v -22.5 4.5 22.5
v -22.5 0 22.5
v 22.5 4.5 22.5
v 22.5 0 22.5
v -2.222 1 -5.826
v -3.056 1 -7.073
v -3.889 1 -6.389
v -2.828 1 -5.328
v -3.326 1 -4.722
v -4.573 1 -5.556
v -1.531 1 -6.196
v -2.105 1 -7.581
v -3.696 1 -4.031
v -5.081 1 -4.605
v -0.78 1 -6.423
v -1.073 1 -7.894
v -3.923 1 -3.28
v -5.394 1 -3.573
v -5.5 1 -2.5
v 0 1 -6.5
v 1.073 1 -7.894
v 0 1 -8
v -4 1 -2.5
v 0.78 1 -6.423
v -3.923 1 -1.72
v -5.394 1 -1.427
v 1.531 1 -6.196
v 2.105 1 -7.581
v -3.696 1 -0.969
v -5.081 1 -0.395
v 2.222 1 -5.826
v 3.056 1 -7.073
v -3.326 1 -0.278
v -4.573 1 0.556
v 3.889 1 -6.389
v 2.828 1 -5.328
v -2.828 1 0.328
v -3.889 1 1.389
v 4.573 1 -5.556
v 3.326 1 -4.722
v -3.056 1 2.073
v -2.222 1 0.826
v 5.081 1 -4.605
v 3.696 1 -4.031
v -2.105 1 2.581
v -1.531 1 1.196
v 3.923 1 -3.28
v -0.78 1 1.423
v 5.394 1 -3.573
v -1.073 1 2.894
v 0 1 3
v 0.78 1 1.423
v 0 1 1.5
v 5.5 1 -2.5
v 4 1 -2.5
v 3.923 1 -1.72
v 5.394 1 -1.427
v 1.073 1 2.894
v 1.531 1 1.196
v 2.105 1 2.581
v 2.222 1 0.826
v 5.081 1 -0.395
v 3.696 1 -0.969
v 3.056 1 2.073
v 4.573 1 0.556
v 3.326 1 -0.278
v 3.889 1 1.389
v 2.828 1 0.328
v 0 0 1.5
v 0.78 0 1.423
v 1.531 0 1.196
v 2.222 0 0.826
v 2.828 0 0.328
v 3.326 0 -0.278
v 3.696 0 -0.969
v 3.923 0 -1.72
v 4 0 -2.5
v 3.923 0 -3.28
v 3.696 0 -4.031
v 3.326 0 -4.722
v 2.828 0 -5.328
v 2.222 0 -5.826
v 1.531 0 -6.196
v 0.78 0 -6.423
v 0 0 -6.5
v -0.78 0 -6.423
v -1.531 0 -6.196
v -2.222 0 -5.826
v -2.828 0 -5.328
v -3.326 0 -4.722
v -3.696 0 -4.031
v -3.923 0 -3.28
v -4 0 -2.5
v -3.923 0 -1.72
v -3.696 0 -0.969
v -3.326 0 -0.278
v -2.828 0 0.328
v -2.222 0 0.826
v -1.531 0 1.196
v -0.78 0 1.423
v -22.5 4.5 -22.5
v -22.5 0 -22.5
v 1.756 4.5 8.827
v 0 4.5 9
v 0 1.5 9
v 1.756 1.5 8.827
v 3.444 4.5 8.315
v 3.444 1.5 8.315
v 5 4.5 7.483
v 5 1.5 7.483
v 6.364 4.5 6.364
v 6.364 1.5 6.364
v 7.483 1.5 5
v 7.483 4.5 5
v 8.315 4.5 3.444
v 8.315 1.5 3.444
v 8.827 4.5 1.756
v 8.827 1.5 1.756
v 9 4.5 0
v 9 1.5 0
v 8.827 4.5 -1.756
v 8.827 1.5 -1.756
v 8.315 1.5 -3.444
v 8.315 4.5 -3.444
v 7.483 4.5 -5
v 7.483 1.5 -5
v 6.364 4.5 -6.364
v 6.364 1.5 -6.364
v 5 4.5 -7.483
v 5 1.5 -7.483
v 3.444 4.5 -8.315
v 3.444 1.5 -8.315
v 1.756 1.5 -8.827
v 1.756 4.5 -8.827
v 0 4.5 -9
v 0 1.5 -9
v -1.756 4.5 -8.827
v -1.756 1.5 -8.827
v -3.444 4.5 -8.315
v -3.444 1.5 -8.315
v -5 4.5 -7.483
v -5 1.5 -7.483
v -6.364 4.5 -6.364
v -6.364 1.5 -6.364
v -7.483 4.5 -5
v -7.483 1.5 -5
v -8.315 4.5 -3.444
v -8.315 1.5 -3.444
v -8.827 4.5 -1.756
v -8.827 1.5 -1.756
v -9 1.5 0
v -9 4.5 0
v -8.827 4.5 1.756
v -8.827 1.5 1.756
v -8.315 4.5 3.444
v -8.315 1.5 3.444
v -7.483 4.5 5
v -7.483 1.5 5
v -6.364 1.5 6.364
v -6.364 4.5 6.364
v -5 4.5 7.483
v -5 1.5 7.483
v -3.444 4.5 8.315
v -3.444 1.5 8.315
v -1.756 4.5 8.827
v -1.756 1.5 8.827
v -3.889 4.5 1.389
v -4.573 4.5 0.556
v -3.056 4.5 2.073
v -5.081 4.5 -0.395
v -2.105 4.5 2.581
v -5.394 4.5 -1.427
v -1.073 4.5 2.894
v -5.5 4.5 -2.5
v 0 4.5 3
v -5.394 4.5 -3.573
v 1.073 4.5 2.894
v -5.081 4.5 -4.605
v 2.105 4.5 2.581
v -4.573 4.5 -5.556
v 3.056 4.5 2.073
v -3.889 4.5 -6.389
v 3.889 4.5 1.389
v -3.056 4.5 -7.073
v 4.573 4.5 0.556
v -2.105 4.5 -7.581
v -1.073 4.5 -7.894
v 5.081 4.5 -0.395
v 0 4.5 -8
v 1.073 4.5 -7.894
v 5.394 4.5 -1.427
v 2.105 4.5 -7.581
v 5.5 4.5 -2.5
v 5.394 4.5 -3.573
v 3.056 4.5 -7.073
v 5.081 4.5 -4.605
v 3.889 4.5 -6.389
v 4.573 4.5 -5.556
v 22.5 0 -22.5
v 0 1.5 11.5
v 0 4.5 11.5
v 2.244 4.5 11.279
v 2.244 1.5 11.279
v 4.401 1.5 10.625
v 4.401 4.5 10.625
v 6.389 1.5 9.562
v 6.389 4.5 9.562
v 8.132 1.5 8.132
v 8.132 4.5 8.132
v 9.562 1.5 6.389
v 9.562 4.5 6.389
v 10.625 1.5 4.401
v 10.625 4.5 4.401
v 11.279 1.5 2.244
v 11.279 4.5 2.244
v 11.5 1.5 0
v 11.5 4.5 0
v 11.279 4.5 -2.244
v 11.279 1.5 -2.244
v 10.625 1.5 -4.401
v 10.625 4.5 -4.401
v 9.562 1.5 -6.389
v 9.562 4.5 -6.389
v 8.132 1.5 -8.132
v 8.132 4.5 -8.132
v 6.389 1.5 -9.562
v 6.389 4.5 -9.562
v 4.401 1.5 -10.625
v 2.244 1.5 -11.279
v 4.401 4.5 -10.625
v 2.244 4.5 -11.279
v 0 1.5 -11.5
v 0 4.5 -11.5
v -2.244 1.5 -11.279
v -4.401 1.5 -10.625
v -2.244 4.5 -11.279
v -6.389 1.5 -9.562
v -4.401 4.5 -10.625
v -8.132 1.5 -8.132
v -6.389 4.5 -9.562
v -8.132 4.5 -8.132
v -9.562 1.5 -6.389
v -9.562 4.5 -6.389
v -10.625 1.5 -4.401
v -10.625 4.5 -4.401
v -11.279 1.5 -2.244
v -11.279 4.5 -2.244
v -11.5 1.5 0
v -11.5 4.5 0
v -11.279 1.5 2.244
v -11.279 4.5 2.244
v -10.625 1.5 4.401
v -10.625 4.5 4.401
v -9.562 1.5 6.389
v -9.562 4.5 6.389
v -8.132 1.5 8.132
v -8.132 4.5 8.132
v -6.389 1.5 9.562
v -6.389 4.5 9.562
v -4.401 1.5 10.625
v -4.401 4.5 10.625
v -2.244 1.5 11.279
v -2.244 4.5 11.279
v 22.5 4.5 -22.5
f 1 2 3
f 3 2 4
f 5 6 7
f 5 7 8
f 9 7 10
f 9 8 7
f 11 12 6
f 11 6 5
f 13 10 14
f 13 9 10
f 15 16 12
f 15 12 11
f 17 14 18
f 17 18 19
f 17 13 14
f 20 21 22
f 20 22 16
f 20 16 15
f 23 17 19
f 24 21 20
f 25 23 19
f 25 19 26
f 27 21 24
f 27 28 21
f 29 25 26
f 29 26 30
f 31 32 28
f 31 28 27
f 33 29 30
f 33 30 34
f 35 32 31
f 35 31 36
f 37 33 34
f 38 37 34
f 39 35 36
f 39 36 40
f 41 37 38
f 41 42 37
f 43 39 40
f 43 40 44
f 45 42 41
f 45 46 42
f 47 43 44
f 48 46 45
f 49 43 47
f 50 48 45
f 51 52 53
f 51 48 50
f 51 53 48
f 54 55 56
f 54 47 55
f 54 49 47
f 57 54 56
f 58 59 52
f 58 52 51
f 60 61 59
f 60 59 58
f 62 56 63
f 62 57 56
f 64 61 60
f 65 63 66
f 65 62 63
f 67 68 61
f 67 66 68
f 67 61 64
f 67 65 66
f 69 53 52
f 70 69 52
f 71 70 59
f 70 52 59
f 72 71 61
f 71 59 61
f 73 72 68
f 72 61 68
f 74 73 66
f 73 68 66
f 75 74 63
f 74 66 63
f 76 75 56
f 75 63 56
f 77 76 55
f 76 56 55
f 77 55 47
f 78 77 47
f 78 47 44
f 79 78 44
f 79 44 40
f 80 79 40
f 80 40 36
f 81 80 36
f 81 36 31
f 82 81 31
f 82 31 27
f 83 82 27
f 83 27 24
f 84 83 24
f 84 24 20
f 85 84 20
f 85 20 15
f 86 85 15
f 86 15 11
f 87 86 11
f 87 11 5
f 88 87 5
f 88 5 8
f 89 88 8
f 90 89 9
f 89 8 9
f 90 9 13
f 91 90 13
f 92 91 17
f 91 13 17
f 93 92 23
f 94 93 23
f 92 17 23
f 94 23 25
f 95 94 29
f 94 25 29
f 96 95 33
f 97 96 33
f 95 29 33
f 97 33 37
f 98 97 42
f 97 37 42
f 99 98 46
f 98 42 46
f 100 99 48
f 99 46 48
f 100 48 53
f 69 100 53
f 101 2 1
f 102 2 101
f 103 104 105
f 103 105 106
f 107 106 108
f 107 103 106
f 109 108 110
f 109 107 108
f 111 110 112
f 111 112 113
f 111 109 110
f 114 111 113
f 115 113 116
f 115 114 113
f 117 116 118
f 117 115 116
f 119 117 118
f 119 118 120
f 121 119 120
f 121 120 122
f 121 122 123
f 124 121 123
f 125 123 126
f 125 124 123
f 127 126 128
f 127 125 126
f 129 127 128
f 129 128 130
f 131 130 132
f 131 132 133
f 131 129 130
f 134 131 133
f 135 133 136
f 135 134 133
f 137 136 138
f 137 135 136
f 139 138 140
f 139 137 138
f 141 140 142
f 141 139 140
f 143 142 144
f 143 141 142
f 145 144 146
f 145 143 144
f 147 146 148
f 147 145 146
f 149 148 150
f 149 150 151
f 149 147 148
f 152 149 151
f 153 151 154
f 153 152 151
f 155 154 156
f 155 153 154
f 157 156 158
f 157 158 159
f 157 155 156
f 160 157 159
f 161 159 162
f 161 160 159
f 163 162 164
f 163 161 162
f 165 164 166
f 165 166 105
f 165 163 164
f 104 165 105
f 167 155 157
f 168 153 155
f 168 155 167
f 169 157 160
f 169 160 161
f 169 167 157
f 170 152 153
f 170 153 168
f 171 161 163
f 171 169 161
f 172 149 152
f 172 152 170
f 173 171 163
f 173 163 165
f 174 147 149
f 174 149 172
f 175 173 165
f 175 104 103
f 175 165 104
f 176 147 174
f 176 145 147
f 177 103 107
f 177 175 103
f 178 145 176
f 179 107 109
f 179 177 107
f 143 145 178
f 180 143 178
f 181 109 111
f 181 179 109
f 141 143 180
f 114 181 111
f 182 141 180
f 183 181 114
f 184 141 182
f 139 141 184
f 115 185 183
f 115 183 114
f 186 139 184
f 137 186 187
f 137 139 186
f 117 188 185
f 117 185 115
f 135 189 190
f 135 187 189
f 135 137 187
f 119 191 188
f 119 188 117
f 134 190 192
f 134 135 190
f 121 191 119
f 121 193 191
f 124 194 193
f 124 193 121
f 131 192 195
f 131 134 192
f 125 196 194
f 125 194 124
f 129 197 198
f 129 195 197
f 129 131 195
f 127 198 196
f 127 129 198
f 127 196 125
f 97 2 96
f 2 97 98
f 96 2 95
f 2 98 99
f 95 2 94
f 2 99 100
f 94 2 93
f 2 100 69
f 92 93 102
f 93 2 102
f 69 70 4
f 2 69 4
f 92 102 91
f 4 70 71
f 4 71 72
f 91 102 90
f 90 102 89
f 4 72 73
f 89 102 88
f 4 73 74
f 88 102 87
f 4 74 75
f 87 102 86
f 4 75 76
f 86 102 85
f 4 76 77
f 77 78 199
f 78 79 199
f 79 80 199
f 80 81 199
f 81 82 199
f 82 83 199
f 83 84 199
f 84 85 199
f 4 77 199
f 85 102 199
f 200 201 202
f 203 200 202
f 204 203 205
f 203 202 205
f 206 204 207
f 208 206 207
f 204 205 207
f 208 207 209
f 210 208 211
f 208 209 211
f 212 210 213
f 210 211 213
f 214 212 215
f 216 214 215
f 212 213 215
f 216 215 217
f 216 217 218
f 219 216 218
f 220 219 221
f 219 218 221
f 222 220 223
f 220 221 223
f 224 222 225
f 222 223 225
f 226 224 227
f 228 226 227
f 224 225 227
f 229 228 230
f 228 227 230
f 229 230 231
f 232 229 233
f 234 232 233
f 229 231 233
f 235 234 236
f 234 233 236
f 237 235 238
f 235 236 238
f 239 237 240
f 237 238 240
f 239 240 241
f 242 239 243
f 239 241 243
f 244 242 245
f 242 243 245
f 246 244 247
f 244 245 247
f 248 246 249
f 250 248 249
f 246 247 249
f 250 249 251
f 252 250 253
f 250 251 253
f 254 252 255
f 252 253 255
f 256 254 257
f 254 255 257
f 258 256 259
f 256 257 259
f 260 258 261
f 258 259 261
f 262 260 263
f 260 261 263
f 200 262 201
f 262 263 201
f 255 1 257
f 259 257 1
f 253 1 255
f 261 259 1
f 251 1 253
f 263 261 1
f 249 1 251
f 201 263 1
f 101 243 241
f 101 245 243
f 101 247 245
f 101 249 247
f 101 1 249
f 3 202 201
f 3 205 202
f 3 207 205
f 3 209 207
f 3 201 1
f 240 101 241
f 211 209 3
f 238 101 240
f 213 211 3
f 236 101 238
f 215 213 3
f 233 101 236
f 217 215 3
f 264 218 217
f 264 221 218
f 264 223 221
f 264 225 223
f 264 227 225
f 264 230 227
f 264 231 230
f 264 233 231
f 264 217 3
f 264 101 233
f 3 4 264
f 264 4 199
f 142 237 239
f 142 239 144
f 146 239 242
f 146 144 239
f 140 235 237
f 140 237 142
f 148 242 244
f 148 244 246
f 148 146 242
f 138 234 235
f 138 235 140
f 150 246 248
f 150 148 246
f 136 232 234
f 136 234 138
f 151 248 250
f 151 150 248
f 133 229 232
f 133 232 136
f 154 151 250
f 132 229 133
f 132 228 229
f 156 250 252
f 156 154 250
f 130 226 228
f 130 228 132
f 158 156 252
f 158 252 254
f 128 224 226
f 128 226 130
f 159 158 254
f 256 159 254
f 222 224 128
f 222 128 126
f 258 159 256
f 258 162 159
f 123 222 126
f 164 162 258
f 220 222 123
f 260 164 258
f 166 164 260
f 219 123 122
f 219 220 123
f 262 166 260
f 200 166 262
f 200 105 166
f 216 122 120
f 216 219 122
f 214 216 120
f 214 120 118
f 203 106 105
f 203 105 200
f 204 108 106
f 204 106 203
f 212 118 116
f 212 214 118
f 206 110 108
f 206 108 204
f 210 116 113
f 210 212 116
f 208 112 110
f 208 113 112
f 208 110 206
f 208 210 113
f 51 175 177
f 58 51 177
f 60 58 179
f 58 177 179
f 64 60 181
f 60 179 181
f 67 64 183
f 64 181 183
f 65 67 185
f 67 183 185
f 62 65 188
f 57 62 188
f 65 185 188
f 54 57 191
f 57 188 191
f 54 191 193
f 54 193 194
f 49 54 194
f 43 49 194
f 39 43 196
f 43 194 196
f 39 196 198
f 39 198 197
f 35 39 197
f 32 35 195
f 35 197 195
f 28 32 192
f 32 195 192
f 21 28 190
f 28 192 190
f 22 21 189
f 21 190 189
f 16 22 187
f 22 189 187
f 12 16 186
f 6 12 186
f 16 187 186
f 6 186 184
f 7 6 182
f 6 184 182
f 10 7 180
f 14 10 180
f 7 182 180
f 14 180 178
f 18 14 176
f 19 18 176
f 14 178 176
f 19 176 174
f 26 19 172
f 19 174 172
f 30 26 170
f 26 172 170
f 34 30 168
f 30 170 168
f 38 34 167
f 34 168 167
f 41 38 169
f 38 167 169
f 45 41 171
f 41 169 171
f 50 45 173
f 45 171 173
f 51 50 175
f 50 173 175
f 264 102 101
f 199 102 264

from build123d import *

# Parameters (mm, degrees)
SKETCH_1_W          = 45
SKETCH_1_H          = 45
EXTRUDE_1_DEPTH     = 4.5
SKETCH_2_R          = 5.5
CUT_EXTRUDE_1_DEPTH = 3.5
SKETCH_3_R          = 4
CUT_EXTRUDE_2_DEPTH = 33.011716605
SKETCH_4_R          = 11.5
SKETCH_4_R_2        = 9
CUT_EXTRUDE_3_DEPTH = 3


with BuildPart() as part:
    # 草图1 → 凸台-拉伸1 (new body)
    with BuildSketch(Plane(origin=(0, 0, 0), x_dir=(1, 0, 0), z_dir=(0, 1, 0))):
        Rectangle(SKETCH_1_W, SKETCH_1_H)
    extrude(amount=EXTRUDE_1_DEPTH)

    # 草图2 → 切除-拉伸1 (cut)
    with BuildSketch(Plane(origin=(0, 4.5, 0), x_dir=(1, 0, 0), z_dir=(0, 1, 0))):
        with Locations(Location((0, 2.5, 0), (0, 0, 270))):
            Circle(SKETCH_2_R)
    extrude(amount=-CUT_EXTRUDE_1_DEPTH, mode=Mode.SUBTRACT)

    # 草图3 → 切除-拉伸2 (cut, through all)
    with BuildSketch(Plane(origin=(0, 1, 0), x_dir=(1, 0, 0), z_dir=(0, 1, 0))):
        with Locations(Location((0, 2.5, 0), (0, 0, 270))):
            Circle(SKETCH_3_R)
    extrude(amount=-CUT_EXTRUDE_2_DEPTH, mode=Mode.SUBTRACT)

    # 草图4 → 切除-拉伸3 (cut)
    with BuildSketch(Plane(origin=(0, 4.5, 0), x_dir=(1, 0, 0), z_dir=(0, 1, 0))):
        with Locations(Location((0, 0, 0), (0, 0, 270))):
            Circle(SKETCH_4_R)
        with Locations(Location((0, 0, 0), (0, 0, 270))):
            Circle(SKETCH_4_R_2, mode=Mode.SUBTRACT)
    extrude(amount=-CUT_EXTRUDE_3_DEPTH, mode=Mode.SUBTRACT)


solid = part.part
